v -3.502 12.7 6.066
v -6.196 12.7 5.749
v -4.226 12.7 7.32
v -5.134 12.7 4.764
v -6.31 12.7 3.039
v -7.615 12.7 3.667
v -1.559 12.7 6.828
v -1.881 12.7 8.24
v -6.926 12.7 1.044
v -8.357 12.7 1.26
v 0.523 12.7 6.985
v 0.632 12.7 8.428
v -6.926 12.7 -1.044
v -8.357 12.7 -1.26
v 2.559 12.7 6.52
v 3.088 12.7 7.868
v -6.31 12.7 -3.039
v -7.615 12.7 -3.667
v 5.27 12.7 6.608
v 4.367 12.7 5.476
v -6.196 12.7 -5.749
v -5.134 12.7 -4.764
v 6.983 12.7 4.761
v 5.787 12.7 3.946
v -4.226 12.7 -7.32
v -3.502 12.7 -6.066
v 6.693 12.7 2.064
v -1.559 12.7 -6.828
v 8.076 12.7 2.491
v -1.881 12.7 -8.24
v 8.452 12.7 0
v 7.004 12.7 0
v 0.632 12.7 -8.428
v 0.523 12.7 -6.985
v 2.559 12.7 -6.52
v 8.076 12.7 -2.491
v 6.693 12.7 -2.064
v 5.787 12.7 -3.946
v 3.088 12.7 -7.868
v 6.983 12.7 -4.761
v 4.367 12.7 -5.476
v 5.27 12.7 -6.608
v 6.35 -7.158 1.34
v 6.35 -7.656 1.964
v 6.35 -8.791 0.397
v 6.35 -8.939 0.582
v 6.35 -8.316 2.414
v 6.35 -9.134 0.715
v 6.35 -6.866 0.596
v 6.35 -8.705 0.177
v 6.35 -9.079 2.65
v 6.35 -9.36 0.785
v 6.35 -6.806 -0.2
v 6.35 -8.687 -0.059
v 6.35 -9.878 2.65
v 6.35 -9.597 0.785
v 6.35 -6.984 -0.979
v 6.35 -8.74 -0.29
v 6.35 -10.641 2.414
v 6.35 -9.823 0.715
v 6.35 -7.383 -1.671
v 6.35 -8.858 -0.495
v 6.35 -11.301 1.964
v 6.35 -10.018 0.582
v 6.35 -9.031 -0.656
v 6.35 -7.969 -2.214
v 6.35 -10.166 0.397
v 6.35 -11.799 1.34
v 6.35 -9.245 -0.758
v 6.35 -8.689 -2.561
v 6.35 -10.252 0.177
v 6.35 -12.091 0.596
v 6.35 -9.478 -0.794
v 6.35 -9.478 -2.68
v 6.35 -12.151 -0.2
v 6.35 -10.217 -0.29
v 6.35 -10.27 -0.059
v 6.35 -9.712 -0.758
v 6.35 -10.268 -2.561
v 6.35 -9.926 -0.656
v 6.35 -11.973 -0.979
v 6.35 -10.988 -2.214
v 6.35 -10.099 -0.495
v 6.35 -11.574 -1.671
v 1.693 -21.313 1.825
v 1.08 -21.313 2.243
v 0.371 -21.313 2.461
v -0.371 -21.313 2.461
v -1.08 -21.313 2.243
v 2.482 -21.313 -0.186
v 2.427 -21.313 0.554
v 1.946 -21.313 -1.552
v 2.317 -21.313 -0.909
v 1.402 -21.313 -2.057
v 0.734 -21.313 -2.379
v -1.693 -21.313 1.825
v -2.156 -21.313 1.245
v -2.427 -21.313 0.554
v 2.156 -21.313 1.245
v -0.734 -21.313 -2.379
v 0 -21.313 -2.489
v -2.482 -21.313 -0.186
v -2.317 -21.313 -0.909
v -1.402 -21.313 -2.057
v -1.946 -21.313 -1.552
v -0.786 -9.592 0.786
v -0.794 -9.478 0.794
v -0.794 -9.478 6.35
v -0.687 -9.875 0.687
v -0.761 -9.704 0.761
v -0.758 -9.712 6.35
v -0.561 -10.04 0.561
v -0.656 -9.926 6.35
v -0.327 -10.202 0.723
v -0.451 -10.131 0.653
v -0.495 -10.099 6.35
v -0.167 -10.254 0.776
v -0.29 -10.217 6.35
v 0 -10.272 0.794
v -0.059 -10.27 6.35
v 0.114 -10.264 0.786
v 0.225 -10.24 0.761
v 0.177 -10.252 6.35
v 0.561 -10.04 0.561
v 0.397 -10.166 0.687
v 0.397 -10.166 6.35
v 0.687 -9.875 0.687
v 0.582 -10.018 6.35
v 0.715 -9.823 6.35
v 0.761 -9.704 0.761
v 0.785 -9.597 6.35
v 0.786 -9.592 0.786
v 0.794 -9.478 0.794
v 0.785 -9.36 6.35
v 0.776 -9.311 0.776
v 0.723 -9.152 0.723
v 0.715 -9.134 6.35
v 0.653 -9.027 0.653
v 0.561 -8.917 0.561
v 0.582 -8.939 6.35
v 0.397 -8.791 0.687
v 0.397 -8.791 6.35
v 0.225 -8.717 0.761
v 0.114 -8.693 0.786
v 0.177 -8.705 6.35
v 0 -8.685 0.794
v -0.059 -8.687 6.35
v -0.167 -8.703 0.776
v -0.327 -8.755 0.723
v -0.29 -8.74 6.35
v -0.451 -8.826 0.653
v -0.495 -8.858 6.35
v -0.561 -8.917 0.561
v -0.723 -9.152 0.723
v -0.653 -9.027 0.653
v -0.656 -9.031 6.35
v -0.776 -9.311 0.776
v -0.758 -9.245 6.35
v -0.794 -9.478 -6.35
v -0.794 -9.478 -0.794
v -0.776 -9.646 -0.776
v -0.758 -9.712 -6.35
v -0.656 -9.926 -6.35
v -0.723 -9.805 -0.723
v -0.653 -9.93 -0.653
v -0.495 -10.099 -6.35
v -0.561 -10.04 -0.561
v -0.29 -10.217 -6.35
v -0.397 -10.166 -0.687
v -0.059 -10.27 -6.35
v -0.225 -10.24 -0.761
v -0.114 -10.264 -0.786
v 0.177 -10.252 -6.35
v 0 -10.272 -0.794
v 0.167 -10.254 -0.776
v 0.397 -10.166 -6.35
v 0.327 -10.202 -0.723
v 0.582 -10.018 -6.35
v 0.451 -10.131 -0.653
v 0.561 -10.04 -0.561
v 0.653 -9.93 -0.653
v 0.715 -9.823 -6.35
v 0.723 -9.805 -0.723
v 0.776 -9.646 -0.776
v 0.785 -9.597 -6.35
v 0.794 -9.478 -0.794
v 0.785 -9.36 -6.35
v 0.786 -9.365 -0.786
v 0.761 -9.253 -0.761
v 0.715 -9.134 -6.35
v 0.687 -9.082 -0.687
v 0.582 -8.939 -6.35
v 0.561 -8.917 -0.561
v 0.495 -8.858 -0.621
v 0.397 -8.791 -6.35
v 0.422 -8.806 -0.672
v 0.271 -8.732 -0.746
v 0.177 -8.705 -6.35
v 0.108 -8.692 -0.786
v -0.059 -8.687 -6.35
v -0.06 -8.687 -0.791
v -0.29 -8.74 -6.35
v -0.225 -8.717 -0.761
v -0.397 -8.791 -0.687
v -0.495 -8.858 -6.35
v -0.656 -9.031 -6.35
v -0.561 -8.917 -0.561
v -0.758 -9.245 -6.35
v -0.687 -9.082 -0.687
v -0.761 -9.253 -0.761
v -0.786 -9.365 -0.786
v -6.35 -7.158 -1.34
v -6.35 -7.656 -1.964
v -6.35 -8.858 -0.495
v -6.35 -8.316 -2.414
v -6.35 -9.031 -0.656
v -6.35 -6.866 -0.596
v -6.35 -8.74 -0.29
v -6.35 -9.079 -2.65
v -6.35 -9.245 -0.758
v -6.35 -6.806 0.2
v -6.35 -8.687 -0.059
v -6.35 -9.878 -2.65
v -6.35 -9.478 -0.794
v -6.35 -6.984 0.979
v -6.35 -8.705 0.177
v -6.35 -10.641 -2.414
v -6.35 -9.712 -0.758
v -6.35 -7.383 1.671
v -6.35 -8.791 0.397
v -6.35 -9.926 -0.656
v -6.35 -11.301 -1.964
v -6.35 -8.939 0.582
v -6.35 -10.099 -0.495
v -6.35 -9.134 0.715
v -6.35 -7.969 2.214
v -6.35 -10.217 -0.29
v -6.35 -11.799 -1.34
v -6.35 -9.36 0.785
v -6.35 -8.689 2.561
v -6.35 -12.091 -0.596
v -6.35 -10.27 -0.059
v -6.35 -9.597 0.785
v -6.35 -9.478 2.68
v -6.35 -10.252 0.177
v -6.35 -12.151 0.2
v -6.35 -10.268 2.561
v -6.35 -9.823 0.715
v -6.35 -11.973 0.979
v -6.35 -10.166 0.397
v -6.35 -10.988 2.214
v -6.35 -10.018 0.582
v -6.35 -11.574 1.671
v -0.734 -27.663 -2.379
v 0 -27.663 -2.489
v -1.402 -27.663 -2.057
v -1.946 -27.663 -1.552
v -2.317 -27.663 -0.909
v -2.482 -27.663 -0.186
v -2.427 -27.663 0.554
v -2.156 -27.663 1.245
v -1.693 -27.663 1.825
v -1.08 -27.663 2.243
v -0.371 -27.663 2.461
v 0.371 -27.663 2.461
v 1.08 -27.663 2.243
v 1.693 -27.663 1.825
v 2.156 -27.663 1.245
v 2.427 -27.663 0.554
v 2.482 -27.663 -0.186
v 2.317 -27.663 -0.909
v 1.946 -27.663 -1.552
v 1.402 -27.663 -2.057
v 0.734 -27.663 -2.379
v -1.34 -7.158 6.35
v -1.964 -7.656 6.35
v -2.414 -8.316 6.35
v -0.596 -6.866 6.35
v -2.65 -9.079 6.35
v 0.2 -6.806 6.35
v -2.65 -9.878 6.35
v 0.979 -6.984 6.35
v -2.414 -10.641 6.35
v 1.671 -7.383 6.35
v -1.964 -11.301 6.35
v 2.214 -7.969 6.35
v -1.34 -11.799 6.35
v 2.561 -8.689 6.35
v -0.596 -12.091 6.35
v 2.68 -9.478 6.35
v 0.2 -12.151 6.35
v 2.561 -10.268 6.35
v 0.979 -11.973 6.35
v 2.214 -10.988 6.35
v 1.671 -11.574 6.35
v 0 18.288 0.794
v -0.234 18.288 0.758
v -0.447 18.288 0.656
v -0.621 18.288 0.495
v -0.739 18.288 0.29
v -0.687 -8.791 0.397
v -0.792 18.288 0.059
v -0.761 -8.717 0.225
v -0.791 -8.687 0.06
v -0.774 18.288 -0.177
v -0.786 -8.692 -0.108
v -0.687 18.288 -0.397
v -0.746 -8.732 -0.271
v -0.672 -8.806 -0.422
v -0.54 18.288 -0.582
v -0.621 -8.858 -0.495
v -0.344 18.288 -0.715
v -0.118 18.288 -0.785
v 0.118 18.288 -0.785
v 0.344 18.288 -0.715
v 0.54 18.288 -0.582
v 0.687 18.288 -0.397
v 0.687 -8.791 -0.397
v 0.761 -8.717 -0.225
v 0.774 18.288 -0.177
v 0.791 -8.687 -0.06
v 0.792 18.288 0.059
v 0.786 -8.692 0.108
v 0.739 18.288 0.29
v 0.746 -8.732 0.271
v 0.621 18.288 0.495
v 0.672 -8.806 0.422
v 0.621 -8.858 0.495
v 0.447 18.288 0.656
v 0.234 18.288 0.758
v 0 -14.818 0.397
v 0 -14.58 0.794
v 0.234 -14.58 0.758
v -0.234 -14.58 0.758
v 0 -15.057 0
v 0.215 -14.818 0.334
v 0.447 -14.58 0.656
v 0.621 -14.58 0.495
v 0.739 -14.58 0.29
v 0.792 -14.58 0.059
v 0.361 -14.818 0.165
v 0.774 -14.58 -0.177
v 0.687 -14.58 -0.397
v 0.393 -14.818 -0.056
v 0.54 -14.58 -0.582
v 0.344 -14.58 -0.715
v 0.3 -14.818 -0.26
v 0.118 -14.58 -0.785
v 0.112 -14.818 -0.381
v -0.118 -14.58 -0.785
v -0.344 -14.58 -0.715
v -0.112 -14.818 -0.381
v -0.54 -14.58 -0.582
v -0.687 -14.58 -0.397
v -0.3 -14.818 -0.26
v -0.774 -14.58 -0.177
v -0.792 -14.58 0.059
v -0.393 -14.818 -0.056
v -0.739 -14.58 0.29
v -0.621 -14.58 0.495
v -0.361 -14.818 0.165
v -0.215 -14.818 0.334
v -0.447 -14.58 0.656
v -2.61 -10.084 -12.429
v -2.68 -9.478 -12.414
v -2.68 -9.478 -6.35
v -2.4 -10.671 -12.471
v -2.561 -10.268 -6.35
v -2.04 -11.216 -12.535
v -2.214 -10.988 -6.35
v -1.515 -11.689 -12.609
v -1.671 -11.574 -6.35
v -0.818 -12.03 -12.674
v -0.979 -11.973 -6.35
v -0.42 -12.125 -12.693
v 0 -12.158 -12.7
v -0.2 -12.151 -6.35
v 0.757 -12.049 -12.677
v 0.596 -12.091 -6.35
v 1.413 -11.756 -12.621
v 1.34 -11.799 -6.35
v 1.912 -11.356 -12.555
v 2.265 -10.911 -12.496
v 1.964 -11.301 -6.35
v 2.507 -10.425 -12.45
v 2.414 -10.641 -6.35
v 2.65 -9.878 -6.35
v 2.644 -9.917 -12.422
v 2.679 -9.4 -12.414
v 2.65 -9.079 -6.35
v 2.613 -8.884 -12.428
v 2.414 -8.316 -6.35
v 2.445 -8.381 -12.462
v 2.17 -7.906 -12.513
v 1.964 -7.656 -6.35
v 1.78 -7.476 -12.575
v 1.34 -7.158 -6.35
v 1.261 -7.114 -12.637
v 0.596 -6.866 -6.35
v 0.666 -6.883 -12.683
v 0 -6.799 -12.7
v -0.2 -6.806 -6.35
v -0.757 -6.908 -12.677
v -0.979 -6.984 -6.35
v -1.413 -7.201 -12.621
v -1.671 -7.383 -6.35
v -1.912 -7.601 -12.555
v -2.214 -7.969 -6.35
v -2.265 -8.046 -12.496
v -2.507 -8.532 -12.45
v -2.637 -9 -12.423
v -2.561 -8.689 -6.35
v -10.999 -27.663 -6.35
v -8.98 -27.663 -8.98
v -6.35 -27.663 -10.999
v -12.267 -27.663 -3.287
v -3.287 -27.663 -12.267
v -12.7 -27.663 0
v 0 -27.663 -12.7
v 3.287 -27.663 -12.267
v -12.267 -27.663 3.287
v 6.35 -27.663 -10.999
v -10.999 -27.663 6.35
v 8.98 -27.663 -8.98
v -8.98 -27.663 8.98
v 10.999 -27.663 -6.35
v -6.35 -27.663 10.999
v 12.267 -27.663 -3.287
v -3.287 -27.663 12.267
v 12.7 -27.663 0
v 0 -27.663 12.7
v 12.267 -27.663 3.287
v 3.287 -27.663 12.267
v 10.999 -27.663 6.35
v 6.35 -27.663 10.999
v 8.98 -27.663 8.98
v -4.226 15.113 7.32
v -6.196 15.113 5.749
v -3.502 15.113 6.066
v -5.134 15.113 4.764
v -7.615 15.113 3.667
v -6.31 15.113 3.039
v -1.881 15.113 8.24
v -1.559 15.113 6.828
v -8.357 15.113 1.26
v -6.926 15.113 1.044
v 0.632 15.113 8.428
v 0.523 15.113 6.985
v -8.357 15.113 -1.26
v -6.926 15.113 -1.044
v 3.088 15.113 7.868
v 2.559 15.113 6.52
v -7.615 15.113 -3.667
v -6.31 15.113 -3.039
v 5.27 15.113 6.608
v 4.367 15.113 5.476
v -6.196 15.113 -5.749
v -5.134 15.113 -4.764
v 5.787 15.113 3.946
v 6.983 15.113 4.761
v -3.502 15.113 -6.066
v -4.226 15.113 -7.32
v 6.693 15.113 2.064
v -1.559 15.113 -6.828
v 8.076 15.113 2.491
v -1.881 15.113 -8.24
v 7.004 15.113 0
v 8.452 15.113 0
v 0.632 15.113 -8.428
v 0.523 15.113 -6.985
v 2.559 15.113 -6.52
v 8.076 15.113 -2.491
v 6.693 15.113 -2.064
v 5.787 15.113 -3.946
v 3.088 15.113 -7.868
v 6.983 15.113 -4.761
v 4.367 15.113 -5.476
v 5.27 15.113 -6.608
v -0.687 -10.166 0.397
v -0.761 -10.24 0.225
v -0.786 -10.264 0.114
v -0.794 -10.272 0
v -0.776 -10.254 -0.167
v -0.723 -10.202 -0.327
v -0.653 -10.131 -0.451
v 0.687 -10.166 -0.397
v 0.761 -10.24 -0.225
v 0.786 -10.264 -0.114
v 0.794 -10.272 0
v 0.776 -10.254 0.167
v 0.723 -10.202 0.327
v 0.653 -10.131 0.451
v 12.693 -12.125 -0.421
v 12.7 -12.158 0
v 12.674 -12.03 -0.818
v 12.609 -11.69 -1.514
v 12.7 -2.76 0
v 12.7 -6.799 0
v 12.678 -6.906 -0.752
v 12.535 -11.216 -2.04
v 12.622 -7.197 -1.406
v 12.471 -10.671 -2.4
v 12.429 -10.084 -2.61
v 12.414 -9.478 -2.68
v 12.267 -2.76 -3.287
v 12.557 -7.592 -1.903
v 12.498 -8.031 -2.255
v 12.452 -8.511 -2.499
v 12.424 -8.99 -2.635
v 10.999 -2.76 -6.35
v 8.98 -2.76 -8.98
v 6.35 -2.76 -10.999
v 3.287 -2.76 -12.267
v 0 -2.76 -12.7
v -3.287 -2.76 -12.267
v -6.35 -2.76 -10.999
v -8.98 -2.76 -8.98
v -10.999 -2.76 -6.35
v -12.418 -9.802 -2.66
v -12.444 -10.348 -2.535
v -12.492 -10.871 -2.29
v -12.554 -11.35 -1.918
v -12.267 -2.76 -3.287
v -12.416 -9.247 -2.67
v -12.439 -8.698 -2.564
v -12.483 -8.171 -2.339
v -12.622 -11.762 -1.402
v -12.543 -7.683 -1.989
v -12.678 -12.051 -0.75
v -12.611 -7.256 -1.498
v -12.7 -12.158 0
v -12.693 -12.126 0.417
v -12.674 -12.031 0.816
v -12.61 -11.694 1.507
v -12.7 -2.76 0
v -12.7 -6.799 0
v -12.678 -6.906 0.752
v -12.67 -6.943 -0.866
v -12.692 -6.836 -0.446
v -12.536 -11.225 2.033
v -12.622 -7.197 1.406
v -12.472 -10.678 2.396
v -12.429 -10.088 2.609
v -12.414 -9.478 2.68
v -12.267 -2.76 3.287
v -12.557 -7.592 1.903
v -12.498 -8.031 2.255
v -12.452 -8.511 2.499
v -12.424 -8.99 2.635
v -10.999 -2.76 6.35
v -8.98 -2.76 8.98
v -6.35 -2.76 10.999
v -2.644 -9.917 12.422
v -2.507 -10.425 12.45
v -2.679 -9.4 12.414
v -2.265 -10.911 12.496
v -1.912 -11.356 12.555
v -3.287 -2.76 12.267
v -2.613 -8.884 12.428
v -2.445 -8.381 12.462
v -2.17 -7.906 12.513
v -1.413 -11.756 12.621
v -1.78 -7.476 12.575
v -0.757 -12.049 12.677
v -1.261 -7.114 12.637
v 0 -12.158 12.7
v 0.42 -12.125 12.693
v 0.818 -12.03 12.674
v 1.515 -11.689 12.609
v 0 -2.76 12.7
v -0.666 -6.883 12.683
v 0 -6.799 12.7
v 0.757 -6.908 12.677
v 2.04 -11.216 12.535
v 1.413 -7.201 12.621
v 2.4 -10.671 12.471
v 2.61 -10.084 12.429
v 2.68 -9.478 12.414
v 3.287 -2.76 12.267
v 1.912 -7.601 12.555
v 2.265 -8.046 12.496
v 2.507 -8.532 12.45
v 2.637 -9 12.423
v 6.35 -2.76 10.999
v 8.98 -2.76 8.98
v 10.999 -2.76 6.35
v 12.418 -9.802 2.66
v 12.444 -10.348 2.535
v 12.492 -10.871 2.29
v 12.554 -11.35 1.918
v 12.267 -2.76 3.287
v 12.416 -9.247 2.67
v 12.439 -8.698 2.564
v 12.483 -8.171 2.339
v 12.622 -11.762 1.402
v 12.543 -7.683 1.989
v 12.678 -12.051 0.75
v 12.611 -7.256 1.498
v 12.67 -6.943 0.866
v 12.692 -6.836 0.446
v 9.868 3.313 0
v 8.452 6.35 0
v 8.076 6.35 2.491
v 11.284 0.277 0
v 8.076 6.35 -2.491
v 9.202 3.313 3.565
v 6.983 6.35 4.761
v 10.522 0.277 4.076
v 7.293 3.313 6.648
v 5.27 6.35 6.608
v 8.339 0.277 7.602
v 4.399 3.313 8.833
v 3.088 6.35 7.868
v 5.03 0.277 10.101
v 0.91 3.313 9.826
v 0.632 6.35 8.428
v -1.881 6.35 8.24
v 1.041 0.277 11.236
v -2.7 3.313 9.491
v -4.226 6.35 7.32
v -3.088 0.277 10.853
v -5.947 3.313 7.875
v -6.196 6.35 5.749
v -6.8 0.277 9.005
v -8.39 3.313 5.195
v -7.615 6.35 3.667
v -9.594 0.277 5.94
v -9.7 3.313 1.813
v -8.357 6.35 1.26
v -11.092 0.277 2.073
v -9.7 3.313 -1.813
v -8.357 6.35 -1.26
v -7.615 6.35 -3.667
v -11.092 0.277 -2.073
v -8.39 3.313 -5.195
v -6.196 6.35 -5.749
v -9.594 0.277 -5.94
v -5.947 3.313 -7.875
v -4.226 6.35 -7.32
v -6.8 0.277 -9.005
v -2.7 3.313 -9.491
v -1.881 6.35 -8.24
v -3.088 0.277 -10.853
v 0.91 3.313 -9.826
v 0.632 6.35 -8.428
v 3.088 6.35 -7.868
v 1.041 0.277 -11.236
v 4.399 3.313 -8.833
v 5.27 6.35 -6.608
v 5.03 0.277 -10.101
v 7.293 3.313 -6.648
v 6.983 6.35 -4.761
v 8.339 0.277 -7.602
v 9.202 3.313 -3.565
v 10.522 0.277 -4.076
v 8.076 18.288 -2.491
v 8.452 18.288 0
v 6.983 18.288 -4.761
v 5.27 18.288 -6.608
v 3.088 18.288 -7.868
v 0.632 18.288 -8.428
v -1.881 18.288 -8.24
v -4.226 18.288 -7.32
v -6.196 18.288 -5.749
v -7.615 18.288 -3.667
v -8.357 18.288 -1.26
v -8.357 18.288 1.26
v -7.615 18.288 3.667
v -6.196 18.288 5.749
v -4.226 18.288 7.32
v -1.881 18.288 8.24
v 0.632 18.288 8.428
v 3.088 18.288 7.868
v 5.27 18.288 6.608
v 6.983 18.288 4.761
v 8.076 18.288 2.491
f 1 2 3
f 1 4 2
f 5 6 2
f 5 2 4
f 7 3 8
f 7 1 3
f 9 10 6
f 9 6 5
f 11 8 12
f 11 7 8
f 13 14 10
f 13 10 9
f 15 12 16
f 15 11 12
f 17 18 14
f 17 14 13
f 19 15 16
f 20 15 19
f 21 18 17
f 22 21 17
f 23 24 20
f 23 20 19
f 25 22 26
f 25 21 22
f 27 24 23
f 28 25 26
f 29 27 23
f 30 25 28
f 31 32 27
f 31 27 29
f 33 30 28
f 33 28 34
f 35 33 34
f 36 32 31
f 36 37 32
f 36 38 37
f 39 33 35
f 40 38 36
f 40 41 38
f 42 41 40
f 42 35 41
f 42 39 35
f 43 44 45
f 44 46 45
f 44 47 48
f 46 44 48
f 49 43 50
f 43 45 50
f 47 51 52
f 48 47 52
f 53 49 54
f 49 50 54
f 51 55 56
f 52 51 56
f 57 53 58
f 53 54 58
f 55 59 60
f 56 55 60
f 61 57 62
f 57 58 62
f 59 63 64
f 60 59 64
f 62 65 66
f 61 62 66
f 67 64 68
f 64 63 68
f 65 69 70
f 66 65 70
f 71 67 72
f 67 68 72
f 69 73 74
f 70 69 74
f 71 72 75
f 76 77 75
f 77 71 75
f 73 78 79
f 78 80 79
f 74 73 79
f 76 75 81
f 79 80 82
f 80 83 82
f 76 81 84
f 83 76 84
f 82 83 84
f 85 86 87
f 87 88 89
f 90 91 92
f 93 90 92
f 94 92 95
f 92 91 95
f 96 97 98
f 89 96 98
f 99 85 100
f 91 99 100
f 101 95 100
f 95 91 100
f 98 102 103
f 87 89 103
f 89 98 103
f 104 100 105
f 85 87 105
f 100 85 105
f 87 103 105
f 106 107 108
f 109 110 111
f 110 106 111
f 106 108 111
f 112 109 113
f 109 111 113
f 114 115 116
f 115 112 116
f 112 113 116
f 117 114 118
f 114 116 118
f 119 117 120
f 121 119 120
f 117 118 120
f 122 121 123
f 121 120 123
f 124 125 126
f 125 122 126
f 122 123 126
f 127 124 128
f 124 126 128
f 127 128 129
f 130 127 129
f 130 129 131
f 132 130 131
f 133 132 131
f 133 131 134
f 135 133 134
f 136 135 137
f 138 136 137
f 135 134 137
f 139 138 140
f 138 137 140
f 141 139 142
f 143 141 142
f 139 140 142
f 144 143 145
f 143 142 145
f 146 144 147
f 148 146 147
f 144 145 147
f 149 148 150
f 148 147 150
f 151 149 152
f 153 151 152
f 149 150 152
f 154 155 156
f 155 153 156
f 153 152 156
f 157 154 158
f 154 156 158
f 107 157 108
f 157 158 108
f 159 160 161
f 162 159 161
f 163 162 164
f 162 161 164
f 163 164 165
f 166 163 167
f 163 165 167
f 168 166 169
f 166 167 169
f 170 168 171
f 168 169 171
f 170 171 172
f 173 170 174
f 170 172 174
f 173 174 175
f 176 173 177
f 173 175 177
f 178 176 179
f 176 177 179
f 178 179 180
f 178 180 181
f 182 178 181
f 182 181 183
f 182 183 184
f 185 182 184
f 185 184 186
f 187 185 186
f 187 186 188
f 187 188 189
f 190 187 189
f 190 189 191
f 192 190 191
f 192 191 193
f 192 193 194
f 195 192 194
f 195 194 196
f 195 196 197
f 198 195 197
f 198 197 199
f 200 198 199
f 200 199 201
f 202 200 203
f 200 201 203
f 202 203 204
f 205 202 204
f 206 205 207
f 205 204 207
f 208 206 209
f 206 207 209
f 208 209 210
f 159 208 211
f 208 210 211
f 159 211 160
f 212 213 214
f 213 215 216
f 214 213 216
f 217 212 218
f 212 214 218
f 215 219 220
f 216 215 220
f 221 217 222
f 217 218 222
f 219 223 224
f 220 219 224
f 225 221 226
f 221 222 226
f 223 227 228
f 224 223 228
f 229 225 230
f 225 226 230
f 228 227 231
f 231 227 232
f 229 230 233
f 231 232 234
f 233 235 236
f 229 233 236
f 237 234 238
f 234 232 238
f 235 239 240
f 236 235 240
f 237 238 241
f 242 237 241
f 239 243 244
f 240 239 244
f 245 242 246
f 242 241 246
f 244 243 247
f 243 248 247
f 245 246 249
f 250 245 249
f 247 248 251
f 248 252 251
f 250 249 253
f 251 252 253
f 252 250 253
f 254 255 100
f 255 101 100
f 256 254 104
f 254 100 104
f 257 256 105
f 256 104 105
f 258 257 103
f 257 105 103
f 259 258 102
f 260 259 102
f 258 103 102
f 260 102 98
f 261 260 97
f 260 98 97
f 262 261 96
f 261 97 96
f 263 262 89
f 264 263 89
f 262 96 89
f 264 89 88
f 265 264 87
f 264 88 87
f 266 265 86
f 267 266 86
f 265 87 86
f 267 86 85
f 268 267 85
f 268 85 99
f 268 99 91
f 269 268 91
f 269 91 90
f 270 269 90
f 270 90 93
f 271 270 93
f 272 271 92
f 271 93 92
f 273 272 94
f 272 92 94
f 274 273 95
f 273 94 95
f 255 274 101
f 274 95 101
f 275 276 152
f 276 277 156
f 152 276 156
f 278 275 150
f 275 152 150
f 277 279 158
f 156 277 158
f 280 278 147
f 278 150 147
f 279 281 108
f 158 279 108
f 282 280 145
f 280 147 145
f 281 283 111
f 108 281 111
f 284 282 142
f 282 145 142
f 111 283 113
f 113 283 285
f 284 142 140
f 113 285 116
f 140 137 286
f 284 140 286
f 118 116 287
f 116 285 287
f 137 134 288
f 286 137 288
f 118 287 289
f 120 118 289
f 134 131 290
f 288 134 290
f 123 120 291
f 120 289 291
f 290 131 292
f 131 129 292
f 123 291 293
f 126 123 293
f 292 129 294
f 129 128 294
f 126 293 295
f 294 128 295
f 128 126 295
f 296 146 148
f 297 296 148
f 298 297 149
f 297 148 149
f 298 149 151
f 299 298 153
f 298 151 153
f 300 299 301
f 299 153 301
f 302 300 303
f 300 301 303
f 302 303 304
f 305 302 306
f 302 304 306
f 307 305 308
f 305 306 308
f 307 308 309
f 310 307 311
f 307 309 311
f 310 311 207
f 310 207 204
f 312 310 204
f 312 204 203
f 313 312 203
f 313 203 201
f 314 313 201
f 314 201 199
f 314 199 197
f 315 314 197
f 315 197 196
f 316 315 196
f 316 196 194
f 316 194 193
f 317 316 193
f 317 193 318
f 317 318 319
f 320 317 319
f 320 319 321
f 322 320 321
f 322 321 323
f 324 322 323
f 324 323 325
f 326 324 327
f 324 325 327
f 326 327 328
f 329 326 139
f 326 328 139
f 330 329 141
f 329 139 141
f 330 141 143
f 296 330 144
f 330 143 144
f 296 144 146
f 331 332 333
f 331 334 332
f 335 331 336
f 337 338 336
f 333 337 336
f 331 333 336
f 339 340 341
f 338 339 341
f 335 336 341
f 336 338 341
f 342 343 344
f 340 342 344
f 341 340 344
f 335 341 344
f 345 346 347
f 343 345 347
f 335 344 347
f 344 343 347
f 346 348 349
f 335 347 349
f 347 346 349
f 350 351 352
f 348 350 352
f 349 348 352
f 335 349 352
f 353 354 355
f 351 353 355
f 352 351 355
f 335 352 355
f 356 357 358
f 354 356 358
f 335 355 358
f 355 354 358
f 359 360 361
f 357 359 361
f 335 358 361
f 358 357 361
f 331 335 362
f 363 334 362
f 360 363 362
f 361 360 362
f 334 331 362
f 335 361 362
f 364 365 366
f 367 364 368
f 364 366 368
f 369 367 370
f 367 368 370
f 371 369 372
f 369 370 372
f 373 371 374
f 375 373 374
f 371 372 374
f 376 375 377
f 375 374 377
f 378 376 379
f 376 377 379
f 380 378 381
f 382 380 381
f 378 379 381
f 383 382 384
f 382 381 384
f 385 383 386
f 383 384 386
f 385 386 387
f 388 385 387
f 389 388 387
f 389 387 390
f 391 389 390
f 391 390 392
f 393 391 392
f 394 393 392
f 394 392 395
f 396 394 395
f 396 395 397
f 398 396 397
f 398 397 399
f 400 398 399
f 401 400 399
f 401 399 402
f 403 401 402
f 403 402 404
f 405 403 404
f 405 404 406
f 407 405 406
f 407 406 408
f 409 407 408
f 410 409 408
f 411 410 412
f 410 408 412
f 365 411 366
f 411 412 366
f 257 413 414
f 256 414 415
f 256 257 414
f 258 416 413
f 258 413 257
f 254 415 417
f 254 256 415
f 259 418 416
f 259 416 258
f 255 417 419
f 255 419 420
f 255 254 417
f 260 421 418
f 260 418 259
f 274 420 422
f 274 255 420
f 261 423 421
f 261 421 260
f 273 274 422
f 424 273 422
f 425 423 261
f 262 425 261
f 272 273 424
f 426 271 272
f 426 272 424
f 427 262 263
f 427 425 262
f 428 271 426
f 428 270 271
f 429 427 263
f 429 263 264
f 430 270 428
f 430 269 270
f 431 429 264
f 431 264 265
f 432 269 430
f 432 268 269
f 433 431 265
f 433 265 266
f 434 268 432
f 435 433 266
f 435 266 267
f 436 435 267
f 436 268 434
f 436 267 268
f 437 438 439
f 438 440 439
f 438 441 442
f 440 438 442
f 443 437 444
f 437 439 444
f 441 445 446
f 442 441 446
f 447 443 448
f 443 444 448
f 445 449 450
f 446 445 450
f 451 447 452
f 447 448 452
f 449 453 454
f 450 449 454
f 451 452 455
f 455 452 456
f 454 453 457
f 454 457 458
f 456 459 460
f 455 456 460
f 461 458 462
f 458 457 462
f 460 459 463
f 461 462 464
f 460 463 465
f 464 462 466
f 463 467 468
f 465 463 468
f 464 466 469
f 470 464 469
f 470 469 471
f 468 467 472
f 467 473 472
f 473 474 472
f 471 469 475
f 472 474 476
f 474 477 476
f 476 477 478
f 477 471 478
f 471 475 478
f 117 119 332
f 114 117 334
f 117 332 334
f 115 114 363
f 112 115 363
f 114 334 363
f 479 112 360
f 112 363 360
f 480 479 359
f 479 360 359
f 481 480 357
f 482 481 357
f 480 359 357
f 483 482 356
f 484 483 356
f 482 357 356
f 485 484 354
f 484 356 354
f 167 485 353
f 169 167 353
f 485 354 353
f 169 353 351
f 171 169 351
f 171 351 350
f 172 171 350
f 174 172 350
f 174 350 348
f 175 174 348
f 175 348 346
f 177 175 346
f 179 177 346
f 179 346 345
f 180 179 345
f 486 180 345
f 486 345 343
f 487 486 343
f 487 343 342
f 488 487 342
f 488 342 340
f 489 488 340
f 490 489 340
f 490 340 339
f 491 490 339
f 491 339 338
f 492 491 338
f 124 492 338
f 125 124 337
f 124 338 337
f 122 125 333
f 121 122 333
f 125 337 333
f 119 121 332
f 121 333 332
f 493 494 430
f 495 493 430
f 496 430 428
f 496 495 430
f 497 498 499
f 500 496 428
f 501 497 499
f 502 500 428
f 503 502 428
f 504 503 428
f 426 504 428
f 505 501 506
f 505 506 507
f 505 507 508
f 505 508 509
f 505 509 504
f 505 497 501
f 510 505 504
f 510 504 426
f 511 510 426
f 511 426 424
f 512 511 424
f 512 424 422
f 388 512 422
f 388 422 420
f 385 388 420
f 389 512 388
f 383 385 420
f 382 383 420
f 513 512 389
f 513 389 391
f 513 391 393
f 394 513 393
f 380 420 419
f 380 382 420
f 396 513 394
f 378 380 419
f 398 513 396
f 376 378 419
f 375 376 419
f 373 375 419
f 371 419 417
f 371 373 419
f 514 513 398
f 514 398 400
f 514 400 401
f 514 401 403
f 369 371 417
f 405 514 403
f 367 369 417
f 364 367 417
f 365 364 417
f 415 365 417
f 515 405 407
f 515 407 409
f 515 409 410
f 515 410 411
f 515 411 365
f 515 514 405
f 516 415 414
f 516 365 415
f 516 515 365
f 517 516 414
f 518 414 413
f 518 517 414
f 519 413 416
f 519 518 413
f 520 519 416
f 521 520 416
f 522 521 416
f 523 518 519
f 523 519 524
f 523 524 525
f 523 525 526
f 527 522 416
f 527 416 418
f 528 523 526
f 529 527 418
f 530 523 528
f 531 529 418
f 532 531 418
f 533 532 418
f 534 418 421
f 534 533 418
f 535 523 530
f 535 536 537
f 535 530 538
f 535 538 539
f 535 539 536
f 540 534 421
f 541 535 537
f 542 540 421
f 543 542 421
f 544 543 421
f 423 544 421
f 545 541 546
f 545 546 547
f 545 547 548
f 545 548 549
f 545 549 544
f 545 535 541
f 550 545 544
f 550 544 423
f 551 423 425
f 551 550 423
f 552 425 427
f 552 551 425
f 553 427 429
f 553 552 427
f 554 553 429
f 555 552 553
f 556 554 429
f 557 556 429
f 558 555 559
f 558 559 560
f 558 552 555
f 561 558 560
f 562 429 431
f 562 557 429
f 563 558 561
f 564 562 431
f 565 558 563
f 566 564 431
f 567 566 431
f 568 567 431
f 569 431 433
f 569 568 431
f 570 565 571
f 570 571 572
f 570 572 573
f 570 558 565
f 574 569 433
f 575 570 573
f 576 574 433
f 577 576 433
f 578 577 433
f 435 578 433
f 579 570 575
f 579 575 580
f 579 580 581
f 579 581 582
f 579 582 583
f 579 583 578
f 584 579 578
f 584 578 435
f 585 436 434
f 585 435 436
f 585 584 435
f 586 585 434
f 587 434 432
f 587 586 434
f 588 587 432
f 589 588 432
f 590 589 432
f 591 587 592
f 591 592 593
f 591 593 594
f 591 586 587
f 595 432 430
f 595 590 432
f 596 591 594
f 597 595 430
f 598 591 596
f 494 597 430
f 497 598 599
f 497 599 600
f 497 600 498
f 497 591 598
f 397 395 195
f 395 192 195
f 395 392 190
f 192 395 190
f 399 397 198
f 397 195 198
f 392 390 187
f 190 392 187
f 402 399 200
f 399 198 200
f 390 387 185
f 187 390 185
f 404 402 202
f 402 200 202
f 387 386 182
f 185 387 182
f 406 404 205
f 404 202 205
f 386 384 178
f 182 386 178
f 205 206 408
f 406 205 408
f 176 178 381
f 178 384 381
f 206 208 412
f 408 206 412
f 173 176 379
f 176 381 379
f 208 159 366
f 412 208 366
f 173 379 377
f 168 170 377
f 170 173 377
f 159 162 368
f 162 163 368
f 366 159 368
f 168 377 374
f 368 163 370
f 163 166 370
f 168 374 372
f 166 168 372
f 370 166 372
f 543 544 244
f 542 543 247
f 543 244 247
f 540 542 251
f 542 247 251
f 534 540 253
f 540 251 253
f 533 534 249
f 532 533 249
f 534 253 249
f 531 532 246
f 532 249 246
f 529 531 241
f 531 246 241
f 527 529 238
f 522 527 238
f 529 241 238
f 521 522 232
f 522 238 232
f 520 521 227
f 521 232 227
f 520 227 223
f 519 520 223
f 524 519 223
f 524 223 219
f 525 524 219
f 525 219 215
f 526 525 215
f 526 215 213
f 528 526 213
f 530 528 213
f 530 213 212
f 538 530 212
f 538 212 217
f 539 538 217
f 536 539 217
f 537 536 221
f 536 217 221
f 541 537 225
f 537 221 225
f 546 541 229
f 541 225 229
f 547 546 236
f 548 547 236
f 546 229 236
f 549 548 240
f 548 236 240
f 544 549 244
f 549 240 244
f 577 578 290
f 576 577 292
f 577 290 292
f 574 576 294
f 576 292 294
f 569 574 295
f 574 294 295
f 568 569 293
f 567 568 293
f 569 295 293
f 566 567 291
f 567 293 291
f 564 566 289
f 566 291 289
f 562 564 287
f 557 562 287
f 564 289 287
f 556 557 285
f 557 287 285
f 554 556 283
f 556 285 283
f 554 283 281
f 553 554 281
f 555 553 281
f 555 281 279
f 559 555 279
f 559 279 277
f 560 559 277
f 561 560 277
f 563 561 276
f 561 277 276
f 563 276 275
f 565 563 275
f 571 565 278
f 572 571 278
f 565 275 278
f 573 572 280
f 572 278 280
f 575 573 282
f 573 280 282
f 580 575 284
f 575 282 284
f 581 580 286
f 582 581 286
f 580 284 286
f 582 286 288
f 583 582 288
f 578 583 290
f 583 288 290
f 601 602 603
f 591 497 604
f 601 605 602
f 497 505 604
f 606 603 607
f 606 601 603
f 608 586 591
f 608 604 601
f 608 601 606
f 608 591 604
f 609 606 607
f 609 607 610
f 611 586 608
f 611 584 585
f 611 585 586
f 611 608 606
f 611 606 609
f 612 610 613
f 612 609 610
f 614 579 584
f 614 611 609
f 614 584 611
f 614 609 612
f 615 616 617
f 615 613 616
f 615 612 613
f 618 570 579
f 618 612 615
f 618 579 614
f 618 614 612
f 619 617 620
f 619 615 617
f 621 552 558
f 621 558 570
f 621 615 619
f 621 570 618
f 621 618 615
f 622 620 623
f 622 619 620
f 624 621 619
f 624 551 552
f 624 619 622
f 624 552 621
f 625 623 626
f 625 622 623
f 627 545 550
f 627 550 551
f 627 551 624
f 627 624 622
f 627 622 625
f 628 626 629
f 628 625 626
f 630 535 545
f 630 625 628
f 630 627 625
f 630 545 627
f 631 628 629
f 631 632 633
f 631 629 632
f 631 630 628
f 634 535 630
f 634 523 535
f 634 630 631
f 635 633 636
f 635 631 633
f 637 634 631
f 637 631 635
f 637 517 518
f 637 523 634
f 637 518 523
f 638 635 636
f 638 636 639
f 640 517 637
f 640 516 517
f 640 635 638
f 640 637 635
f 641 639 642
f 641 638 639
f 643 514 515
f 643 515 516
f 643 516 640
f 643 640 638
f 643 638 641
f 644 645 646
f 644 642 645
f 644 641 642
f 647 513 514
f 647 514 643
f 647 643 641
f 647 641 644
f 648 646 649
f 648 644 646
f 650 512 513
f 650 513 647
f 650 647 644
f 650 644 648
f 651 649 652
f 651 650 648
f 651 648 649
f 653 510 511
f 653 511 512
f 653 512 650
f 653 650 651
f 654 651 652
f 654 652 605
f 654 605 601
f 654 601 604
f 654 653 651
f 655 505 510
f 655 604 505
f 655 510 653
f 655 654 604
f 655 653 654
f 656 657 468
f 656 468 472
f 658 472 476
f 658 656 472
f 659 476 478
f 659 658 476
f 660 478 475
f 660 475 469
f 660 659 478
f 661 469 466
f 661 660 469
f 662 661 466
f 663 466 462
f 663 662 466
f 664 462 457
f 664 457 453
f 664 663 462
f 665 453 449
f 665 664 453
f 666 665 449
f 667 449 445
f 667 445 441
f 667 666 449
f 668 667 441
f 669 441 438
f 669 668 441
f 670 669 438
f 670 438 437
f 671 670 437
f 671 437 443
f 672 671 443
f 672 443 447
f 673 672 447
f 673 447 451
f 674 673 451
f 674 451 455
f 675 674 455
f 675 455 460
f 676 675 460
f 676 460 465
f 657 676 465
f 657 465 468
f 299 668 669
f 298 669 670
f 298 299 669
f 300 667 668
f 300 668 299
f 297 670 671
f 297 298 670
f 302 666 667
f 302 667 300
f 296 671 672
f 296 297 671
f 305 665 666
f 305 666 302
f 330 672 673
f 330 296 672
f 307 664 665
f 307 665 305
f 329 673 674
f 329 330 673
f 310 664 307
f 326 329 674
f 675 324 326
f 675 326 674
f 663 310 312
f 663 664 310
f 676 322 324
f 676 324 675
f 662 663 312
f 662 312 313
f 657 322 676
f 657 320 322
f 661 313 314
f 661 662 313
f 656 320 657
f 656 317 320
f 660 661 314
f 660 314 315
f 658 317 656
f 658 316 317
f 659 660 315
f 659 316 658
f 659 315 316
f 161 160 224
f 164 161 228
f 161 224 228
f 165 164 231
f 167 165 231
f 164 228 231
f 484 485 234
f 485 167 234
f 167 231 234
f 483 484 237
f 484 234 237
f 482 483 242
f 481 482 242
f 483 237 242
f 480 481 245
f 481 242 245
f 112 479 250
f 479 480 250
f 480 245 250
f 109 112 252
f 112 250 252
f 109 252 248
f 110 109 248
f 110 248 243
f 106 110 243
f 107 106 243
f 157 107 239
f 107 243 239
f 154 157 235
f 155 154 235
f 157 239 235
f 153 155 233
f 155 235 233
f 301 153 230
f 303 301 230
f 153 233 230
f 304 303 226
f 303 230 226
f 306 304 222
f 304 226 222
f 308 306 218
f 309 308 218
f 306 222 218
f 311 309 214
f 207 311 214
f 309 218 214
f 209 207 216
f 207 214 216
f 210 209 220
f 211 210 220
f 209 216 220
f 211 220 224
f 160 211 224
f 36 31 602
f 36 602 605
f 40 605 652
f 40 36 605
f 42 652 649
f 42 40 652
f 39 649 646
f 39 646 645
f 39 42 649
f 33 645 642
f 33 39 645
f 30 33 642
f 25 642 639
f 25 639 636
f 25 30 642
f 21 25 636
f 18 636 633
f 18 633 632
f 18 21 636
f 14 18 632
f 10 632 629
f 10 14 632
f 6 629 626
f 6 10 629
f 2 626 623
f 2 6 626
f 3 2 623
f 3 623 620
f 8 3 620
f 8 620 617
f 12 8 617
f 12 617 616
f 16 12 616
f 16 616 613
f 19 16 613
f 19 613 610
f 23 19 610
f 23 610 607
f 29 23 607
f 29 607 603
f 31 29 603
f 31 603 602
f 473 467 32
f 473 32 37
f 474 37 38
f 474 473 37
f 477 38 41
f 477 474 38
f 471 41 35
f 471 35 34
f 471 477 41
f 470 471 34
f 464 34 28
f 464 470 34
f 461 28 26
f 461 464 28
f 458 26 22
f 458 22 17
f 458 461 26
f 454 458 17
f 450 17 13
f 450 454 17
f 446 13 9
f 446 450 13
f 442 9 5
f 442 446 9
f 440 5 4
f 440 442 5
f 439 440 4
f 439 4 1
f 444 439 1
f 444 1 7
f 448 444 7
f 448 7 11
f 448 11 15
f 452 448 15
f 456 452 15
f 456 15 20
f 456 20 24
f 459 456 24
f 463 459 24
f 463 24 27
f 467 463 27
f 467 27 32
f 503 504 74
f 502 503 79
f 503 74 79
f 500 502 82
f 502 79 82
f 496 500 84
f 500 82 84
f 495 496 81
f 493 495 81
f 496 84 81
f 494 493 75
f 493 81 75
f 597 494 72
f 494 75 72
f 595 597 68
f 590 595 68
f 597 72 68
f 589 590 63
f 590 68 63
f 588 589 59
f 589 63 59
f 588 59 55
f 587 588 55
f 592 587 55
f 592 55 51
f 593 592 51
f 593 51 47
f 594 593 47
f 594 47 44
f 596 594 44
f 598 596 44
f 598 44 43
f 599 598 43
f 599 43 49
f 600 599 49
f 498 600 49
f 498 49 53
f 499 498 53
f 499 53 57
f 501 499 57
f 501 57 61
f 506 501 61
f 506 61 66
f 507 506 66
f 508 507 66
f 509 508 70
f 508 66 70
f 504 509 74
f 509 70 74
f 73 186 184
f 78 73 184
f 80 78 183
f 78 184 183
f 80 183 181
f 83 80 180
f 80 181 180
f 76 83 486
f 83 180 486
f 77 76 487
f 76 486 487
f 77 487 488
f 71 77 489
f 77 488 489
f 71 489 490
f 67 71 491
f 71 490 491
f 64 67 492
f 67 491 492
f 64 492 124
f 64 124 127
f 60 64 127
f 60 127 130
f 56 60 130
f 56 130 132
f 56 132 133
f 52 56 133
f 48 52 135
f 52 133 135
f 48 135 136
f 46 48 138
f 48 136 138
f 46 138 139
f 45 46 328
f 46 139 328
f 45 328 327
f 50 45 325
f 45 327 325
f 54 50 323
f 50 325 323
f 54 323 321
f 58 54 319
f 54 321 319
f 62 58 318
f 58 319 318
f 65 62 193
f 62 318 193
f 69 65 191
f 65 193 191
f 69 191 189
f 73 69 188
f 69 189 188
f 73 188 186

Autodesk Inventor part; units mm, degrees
ref_plane "YZ Plane" through (0, 0, 0) normal (1, 0, 0) x (0, 1, 0)
ref_plane "XZ Plane" through (0, 0, 0) normal (0, 1, 0) x (-1, 0, 0)
ref_plane "XY Plane" through (0, 0, 0) normal (0, 0, 1) x (1, 0, 0)
sketch "Sketch1" plane through (0, 0, 0) normal (0, 0, 1) x (1, 0, 0)
  line L0 (0, 0) -> (8.4519, 0)
  line L1 (8.4519, 0) -> (8.4519, 12.7)
  line L2 (8.4519, 12.7) -> (7.0041, 12.7)
  line L3 (7.0041, 12.7) -> (7.0041, 15.113)
  line L4 (7.0041, 15.113) -> (8.4519, 15.113)
  line L5 (8.4519, 15.113) -> (8.4519, 18.288)
  line L6 (8.4519, 18.288) -> (0, 18.288)
  line L7 (0, 18.288) -> (0, 0)
  line L8 (0, -29.2334) -> (0, 26.2082) projected
  line L9 (8.4519, 0) -> (8.4519, 6.35)
  line L10 (8.4519, 0) -> (8.4519, 6.35)
  line L11 (8.4519, 6.35) -> (15.4293, -8.6131)
  line L12 (8.4519, 6.35) -> (24.9619, 6.35) construction
  line L13 (15.4293, -8.6131) -> (12.2543, -8.6131)
  line L14 (12.2543, -8.6131) -> (8.4519, 0)
  line L15 (15.4293, -8.6131) -> (0, -8.6131)
  line L16 (0, 0) -> (8.4519, 0)
  line L17 (0, -8.6131) -> (12.7, -8.6131)
  line L18 (12.7, -8.6131) -> (12.7, -21.3131)
  line L19 (12.7, -21.3131) -> (0, -21.3131)
  line L20 (0, -21.3131) -> (0, -8.6131)
  line L21 (12.7, -8.6131) -> (12.7, -2.7602)
  point P0 (12.2543, -8.6131)
  dimension "d0" = 8.4519
  dimension "d1" = 12.7
  dimension "d2" = 90
  dimension "d3" = 1.4478
  dimension "d4" = 2.413
  dimension "d5" = 3.175
  dimension "d23" = 16.51
  dimension "d24" = 65
  dimension "d25" = 3.175
  dimension "d83" = 12.7
  dimension "d84" = 12.7
revolve "Revolution1" add sketch "Sketch1" angle 360 about axis through (0, -10, 0) along (0, 1, 0) contours L7 L6 L5 L4 L3 L2 L1 L0 | L0 L14 L15 L8 | L1 L11 L21 L13 L14 | L15 L13 L18 L19 L8
sketch "Sketch12" plane through (0, 18.288, 0) normal (0, 1, 0) x (1, 0, 0)
  point P0 (0, 0)
  point P1 (0, 0)
hole "Hole4" at (0, 18.288, 0) direction (0, -1, 0) diameter 1.5875 depth 32.8676 tip angle 118
sketch "Sketch13" plane through (0, -21.3131, 0) normal (0, -1, 0) x (1, 0, 0)
  circle A0 centre (0, 0) radius 12.7 projected
  point P0 (12.7, 0)
  point P1 (0, -12.7)
  point P2 (-12.7, 0)
  point P3 (0, 12.7)
ref_plane "Work Plane1" through (12.7, -21.3131, 0) normal (1, 0, 0) x (0, 1, 0)
sketch "Sketch14" plane through (12.7, -21.3131, 0) normal (1, 0, 0) x (0, 1, 0)
  line L0 (0, 12.7) -> (0, -12.7) projected
  line L1 (0, 0) -> (18.553, 0)
  line L2 (18.553, 12.7) -> (18.553, -12.7) projected
  line L3 (18.553, 0) -> (11.8347, 0)
  point P0 (21.3131, 0)
  dimension "d92" = 6.7183
hole "Hole5" at (12.7, -9.4785, 0) direction (-1, 0, 0) diameter 1.5875 end through all
hole "Hole6" at (12.7, -9.4785, 0) direction (-1, 0, 0) diameter 5.3594 depth 6.35 thread size "1/4-28 UNF" class "2B" standard "ANSI Unified Screw Threads"
extrude "Extrusion3" add sketch "Sketch13" along normal blind 6.35
sketch "Sketch16" plane through (0, -27.6631, 0) normal (0, -1, 0) x (1, 0, 0)
  point P0 (0, 0)
hole "Hole8" at (0, -27.6631, 0) direction (0, 1, 0) diameter 4.9784 depth 6.35 thread size "1/4-20 UNC" class "2B" standard "ANSI Unified Screw Threads"
pattern_circular "Circular Pattern5" count 4 over 360 about axis through (0, -10, 0) along (0, 1, 0) of "Hole5", "Hole6"
equation "\"d54\" = 55deg"
equation "\"Sketch7_Pitch\" = 0.90714"
equation "\"d72\" = 55deg"
equation "\"Sketch9_Pitch\" = 1.27"
equation "\"d137\" = 55deg"
equation "\"Sketch17_Pitch\" = 1.27"
equation "\"d155\" = 55deg"
equation "\"Sketch19_Pitch\" = 0.90714"
equation "\"d173\" = 55deg"
equation "\"Sketch21_Pitch\" = 0.90714"
equation "\"d191\" = 55deg"
equation "\"Sketch23_Pitch\" = 1.27"
equation "\"d221\" = 55deg"
equation "\"Sketch25_Pitch\" = 0.90714"
equation "\"d239\" = 55deg"
equation "\"Sketch27_Pitch\" = 1.27"
properties part number "piston badflowchannel-1-16in-thread"
